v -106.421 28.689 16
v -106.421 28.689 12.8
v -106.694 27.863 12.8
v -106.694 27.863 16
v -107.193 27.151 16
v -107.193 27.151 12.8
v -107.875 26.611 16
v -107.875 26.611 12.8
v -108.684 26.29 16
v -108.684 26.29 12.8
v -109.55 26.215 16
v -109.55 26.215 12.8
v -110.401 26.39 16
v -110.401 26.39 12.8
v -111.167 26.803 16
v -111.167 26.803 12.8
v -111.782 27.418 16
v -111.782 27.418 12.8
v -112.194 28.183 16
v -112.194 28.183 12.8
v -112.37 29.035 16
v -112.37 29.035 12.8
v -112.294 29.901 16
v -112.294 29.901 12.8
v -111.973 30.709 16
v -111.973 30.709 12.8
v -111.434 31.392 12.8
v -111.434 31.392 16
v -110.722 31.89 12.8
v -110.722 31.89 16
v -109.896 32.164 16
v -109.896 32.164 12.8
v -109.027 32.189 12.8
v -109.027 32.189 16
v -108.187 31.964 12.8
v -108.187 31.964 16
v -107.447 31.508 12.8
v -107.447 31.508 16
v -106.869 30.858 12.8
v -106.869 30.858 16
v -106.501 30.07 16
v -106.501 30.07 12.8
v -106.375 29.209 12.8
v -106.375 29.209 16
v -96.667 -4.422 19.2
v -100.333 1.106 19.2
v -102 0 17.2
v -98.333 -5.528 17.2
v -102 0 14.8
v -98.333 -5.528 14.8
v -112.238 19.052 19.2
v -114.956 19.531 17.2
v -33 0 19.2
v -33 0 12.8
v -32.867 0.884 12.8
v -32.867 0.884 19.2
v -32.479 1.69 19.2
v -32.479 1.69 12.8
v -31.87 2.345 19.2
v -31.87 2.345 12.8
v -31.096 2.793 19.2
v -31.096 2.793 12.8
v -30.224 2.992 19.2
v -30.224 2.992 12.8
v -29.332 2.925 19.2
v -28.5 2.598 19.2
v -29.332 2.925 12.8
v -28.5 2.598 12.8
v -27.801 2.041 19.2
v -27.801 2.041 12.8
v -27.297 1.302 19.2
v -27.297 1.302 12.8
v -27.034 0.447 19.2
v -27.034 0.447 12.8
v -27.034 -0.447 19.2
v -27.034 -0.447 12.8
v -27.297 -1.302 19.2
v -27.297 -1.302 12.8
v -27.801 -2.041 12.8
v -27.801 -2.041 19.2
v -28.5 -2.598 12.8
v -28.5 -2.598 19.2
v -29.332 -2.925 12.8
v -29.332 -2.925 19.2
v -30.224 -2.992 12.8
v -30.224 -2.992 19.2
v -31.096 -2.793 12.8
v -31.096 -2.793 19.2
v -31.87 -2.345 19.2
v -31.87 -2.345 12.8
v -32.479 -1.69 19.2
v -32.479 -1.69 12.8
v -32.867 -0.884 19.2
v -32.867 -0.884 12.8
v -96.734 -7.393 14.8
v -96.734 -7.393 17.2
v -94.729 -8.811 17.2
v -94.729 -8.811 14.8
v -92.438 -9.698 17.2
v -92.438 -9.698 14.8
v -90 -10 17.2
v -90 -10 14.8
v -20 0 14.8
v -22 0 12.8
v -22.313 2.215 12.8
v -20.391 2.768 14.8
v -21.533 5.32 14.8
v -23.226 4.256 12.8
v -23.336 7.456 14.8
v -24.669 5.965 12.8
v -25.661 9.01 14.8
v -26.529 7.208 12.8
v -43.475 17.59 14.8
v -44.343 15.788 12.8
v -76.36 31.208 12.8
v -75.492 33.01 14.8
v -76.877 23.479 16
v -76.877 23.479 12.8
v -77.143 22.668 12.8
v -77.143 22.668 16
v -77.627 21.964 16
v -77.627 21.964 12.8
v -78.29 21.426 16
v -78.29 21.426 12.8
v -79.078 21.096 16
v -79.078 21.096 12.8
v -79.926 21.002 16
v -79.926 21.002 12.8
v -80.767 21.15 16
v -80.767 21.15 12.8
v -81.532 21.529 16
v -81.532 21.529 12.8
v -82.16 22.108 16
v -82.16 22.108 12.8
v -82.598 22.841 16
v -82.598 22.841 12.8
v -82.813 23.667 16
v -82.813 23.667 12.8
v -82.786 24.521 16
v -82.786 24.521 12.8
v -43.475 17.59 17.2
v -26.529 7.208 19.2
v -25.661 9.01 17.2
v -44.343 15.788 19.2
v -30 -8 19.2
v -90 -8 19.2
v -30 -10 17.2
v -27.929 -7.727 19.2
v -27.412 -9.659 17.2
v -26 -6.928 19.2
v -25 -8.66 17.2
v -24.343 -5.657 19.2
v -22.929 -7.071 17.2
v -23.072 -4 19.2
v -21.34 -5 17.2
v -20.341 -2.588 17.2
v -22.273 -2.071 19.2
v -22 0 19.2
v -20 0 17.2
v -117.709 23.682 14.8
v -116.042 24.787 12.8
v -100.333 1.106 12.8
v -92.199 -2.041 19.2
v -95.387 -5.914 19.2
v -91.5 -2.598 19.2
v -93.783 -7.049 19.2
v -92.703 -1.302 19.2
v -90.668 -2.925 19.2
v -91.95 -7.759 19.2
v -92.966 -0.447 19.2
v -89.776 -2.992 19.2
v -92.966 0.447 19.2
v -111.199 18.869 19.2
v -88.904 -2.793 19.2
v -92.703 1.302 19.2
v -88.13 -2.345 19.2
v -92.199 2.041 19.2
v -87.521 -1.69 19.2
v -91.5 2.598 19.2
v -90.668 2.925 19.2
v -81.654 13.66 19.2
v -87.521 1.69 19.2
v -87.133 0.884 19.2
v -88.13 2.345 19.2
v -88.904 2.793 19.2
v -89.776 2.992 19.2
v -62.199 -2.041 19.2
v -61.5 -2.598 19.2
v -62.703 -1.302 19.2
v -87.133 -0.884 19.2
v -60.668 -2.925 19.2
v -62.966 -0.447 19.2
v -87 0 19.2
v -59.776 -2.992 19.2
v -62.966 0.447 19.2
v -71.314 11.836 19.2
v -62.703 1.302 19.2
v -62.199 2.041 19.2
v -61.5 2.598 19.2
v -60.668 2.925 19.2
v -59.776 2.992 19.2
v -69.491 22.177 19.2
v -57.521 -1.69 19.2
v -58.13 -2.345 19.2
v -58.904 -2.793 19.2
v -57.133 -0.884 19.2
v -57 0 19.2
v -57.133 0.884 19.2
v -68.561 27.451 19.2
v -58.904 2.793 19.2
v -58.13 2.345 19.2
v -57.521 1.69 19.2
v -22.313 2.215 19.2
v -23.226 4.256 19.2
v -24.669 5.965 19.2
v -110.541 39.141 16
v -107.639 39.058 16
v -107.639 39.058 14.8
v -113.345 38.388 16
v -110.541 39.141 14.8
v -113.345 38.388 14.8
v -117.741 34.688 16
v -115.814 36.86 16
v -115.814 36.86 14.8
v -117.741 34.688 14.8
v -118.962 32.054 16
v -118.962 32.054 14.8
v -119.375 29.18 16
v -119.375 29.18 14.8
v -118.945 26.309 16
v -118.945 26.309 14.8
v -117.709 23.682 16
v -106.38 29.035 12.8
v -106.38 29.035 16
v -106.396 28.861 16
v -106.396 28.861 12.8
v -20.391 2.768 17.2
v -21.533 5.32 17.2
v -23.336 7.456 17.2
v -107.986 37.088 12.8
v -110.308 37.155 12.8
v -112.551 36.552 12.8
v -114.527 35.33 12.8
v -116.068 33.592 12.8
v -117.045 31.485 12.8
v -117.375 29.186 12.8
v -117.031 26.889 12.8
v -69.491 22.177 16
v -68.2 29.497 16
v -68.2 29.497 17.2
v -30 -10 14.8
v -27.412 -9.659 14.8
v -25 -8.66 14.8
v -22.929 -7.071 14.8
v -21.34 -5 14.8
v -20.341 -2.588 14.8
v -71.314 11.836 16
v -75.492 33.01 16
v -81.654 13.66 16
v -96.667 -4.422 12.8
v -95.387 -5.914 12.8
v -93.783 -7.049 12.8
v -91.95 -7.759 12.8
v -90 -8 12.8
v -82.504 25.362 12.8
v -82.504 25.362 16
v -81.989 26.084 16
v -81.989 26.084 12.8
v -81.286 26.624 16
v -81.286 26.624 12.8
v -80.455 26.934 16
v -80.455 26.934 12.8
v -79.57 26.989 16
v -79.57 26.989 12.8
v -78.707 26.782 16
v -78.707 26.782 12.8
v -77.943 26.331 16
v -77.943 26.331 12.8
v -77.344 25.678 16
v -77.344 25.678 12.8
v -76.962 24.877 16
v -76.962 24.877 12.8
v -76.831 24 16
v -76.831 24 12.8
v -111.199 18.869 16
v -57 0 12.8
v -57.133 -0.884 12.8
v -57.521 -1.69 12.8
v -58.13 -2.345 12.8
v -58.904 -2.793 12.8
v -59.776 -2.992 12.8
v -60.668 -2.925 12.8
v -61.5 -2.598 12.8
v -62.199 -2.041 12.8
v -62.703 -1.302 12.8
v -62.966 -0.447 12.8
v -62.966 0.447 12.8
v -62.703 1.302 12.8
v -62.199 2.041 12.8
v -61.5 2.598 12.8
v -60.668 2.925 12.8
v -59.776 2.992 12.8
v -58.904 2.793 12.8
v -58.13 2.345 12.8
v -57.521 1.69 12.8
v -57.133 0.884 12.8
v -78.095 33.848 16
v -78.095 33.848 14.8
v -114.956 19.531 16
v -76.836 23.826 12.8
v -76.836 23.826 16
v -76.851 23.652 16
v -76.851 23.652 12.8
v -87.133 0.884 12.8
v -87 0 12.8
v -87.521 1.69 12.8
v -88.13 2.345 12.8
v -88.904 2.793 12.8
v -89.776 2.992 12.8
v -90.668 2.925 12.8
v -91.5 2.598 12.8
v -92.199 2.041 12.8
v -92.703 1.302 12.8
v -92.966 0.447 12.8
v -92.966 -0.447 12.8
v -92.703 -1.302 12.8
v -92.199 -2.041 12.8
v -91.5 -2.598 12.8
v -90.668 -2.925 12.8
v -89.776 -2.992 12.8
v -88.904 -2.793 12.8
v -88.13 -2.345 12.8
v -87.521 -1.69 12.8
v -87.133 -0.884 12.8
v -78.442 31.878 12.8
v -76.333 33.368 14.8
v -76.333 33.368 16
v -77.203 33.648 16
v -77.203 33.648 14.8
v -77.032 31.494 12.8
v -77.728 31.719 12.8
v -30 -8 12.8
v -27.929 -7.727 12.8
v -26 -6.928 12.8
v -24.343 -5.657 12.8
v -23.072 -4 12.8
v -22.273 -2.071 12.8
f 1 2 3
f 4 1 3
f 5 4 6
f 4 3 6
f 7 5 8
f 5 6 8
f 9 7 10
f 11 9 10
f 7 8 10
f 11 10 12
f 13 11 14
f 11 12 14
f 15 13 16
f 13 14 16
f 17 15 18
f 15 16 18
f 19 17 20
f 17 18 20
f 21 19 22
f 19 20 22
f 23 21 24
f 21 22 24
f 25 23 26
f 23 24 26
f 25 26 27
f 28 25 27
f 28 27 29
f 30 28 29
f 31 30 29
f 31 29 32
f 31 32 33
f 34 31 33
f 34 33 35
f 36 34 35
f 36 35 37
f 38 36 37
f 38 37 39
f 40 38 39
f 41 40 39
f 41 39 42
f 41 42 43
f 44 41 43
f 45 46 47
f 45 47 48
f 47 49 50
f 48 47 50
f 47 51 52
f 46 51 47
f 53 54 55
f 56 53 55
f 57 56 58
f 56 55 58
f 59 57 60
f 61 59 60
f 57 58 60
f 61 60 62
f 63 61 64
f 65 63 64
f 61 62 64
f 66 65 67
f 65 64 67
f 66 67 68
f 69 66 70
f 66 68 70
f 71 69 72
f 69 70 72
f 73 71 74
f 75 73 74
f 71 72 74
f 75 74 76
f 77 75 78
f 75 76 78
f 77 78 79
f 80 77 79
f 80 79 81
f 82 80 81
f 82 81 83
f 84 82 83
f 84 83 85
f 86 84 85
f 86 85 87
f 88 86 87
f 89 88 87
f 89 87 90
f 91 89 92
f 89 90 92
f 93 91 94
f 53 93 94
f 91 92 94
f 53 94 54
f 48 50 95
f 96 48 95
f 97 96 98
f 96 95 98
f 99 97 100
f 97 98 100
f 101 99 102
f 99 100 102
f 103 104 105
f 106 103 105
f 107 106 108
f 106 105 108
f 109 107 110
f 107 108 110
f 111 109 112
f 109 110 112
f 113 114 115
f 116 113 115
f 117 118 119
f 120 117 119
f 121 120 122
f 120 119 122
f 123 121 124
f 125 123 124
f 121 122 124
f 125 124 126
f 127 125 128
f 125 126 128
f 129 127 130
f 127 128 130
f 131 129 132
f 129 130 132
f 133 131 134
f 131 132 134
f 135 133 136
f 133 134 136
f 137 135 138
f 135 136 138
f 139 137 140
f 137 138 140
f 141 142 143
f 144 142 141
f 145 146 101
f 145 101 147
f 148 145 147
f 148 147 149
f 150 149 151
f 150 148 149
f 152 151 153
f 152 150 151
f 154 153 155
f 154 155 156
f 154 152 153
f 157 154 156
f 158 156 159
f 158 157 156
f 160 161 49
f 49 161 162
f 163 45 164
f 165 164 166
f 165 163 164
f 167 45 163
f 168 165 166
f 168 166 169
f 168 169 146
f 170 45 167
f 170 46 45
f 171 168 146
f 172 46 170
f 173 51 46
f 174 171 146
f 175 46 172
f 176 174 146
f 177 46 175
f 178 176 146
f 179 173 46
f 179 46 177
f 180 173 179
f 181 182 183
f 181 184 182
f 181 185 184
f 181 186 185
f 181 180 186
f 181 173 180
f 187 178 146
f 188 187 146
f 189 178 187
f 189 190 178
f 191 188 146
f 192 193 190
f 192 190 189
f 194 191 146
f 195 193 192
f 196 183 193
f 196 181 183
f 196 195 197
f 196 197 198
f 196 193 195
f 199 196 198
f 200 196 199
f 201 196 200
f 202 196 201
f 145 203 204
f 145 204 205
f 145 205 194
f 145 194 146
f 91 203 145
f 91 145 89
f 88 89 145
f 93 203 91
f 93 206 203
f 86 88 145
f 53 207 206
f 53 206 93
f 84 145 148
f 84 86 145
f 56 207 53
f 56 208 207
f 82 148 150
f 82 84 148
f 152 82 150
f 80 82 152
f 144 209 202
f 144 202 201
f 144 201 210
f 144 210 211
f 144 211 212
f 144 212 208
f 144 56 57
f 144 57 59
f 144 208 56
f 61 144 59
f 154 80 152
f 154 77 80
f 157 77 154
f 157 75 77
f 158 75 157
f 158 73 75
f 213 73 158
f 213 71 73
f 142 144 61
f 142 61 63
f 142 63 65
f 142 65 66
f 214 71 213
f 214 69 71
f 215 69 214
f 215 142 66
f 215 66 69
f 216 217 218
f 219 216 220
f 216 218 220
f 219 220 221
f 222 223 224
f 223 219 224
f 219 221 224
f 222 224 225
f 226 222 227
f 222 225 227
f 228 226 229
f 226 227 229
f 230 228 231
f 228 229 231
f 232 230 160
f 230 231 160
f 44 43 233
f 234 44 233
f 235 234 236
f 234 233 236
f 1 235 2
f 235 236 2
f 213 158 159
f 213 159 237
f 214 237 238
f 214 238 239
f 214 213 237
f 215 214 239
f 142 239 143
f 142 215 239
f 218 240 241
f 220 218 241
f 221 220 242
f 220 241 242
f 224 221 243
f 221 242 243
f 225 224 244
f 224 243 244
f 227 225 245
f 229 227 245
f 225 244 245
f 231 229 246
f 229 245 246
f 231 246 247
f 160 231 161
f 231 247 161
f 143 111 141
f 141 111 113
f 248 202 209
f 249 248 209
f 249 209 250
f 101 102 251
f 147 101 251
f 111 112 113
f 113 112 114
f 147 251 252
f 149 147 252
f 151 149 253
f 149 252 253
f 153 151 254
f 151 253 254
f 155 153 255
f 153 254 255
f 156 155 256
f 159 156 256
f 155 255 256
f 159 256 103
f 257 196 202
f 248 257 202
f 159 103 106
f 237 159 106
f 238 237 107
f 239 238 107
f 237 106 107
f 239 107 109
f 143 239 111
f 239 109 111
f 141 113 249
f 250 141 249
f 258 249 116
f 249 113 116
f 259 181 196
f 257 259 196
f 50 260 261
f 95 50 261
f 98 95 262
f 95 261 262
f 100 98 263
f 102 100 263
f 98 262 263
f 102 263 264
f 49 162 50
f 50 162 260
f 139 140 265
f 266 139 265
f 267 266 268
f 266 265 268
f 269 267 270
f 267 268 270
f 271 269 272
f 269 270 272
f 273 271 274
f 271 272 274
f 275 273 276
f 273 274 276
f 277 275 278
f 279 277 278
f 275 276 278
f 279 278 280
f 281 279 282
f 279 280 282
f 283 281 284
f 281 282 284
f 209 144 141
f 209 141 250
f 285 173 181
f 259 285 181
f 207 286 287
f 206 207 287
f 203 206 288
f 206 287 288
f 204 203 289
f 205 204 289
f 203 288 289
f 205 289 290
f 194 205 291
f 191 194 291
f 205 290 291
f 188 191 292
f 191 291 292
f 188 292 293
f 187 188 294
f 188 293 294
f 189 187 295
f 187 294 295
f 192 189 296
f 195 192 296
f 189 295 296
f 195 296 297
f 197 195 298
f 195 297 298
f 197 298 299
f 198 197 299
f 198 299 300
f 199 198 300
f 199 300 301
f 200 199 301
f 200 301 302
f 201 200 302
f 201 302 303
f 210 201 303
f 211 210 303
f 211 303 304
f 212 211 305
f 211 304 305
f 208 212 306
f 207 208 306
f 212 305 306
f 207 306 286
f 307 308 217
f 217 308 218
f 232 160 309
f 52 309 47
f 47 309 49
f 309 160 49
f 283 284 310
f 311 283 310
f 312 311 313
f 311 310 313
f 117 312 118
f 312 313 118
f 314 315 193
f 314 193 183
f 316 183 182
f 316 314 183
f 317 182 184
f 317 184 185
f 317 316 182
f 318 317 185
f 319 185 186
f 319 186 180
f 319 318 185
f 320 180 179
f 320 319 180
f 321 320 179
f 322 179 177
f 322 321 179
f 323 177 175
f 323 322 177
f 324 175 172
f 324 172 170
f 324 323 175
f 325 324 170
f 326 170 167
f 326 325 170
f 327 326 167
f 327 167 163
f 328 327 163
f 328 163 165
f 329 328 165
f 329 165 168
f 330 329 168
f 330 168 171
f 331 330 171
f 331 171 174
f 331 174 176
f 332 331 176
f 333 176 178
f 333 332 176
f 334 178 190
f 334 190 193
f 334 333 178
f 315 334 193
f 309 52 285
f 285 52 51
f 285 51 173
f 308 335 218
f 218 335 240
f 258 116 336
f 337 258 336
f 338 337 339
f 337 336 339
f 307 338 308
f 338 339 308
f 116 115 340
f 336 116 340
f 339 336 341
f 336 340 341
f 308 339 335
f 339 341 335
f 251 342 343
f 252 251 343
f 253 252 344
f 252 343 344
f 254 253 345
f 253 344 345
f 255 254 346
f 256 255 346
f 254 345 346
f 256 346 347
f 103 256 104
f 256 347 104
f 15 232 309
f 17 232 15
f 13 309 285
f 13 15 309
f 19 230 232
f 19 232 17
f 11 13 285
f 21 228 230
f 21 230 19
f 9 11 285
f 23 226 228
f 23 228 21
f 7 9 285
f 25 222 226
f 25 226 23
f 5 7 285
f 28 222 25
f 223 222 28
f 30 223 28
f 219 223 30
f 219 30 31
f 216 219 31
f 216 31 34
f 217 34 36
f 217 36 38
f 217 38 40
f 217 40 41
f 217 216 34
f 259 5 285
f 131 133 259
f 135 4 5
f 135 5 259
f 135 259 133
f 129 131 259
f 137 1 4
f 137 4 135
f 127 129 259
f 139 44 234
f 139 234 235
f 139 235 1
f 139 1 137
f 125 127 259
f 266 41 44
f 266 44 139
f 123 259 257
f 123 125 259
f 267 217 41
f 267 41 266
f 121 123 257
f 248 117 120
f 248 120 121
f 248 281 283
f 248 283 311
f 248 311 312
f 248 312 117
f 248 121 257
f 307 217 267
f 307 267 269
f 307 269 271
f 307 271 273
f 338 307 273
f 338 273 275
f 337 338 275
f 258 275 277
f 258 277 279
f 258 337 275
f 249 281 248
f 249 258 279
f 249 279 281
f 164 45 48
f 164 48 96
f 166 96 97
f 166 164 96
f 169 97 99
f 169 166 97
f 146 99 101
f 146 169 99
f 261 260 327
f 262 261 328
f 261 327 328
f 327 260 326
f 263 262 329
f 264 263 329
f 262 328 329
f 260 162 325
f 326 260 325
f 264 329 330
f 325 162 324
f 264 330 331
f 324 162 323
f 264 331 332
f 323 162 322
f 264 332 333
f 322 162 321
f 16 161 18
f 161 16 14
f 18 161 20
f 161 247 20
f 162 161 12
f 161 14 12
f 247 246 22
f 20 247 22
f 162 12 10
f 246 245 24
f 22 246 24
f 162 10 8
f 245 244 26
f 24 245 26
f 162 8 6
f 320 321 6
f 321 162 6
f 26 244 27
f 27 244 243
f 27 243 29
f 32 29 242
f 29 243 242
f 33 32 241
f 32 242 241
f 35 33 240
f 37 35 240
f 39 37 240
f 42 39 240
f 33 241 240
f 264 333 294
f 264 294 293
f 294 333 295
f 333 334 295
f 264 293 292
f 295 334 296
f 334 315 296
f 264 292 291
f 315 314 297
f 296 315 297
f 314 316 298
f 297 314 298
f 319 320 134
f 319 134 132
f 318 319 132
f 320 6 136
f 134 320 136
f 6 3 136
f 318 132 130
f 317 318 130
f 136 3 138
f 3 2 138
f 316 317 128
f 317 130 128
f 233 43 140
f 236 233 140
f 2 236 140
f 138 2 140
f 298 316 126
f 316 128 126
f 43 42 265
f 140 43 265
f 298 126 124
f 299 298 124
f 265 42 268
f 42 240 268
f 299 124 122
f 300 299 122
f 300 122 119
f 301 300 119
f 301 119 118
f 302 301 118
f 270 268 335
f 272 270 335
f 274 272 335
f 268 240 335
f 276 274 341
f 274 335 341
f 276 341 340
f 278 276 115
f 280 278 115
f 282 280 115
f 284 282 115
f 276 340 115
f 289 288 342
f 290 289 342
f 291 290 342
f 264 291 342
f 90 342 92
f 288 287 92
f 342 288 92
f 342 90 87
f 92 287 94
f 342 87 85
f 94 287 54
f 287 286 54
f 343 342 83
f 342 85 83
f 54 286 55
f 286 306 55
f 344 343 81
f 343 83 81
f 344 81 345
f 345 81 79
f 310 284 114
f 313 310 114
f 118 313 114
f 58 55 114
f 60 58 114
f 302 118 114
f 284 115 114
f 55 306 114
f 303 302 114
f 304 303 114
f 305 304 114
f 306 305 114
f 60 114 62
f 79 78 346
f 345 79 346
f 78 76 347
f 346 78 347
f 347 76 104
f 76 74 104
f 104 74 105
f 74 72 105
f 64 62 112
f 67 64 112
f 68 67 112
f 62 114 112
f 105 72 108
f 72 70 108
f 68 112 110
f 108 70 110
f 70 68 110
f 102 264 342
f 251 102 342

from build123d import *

# Parameters (mm, degrees)
F0_R     = 3
F1_DEPTH = 6.4
F4_DEPTH = 3.2
F5_SIZE  = 2


with BuildPart() as f1:
    # F0 (on Top) → F1 (new body)
    with BuildSketch(Plane.XY):
        with BuildLine():
            Line((-69.9830439783, 22.2635182233), (-43.4754125815, 17.5895076134))
            Line((-43.4754125815, 17.5895076134), (-75.4919030254, 33.0095051449))
            ThreePointArc((-75.4919030254, 33.0095051449), (-71.3637669974, 29.3201416884), (-69.8311215084, 24))
            ThreePointArc((-69.8311215084, 24), (-69.8691745275, 23.1284425725), (-69.9830439783, 22.2635182233))
        make_face()
        with BuildLine():
            Line((-90, -10), (-30, -10))
            ThreePointArc((-30, -10), (-37.0710678119, -7.0710678119), (-40, 0))
            Line((-40, 0), (-57, 0))
            ThreePointArc((-57, 0), (-60, -3), (-63, 0))
            Line((-63, 0), (-80, 0))
            ThreePointArc((-80, 0), (-82.9289321881, -7.0710678119), (-90, -10))
        make_face()
        with BuildLine():
            Line((-78.0946397318, 33.8480775301), (-107.6388723221, 39.0575228601))
            ThreePointArc((-107.6388723221, 39.0575228601), (-101.7149096676, 35.6373214269), (-99.3753540988, 29.20944533))
            ThreePointArc((-99.3753540988, 29.20944533), (-99.4134071179, 28.3378879025), (-99.5272765687, 27.4729635533))
            Line((-99.5272765687, 27.4729635533), (-89.6791990386, 25.7364817767))
            ThreePointArc((-89.6791990386, 25.7364817767), (-85.566885872, 32.1915204429), (-78.0946397318, 33.8480775301))
        make_face()
        with BuildLine():
            ThreePointArc((-89.6791990386, 25.7364817767), (-81.5676032851, 14.1519224699), (-69.9830439783, 22.2635182233))
            Line((-69.9830439783, 22.2635182233), (-76.8766982494, 23.479055467))
            ThreePointArc((-76.8766982494, 23.479055467), (-80.3520660414, 21.045576741), (-82.7855447675, 24.520944533))
            Line((-82.7855447675, 24.520944533), (-89.6791990386, 25.7364817767))
        make_face()
        with BuildLine():
            ThreePointArc((-69.8311215084, 24), (-71.3637669974, 29.3201416884), (-75.4919030254, 33.0095051449))
            ThreePointArc((-75.4919030254, 33.0095051449), (-76.7644727965, 33.5181755435), (-78.0946397318, 33.8480775301))
            ThreePointArc((-78.0946397318, 33.8480775301), (-85.566885872, 32.1915204429), (-89.6791990386, 25.7364817767))
            Line((-89.6791990386, 25.7364817767), (-82.7855447675, 24.520944533))
            ThreePointArc((-82.7855447675, 24.520944533), (-79.5696542802, 26.9885840943), (-76.8311215084, 24))
            ThreePointArc((-76.8311215084, 24), (-76.8425374142, 23.7385327718), (-76.8766982494, 23.479055467))
            Line((-76.8766982494, 23.479055467), (-69.9830439783, 22.2635182233))
            ThreePointArc((-69.9830439783, 22.2635182233), (-69.8691745275, 23.1284425725), (-69.8311215084, 24))
        make_face()
        with BuildLine():
            Line((-57, 0), (-40, 0))
            ThreePointArc((-40, 0), (-35.3201416884, 8.467354511), (-25.660781517, 9.0095051449))
            Line((-25.660781517, 9.0095051449), (-43.4754125815, 17.5895076134))
            Line((-43.4754125815, 17.5895076134), (-69.9830439783, 22.2635182233))
            ThreePointArc((-69.9830439783, 22.2635182233), (-81.5676032851, 14.1519224699), (-89.6791990386, 25.7364817767))
            Line((-89.6791990386, 25.7364817767), (-99.5272765687, 27.4729635533))
            ThreePointArc((-99.5272765687, 27.4729635533), (-107.3340404203, 19.4200102868), (-117.7086874321, 23.6817373461))
            Line((-117.7086874321, 23.6817373461), (-102, 0))
            Line((-102, 0), (-98.3333333333, -5.5277079839))
            ThreePointArc((-98.3333333333, -5.5277079839), (-92.8867513459, 9.5742710776), (-80, 0))
            Line((-80, 0), (-63, 0))
            ThreePointArc((-63, 0), (-60, 3), (-57, 0))
        make_face()
        with BuildLine():
            ThreePointArc((-98.3333333333, -5.5277079839), (-94.7287905515, -8.8112734562), (-90, -10))
            ThreePointArc((-90, -10), (-82.9289321881, -7.0710678119), (-80, 0))
            ThreePointArc((-80, 0), (-92.8867513459, 9.5742710776), (-98.3333333333, -5.5277079839))
        make_face()
        with Locations((-90, 0)):
            Circle(F0_R, mode=Mode.SUBTRACT)
        with BuildLine():
            ThreePointArc((-107.6388723221, 39.0575228601), (-117.7409567465, 34.6881944885), (-117.7086874321, 23.6817373461))
            ThreePointArc((-117.7086874321, 23.6817373461), (-107.3340404203, 19.4200102868), (-99.5272765687, 27.4729635533))
            ThreePointArc((-99.5272765687, 27.4729635533), (-99.4134071179, 28.3378879025), (-99.3753540988, 29.20944533))
            ThreePointArc((-99.3753540988, 29.20944533), (-101.7149096676, 35.6373214269), (-107.6388723221, 39.0575228601))
        make_face()
        with BuildLine():
            ThreePointArc((-106.3753540988, 29.20944533), (-106.3867700045, 28.9479781018), (-106.4209308398, 28.688500797))
            ThreePointArc((-106.4209308398, 28.688500797), (-112.3639381931, 29.4709125583), (-106.3753540988, 29.20944533))
        make_face(mode=Mode.SUBTRACT)
        with BuildLine():
            ThreePointArc((-40, 0), (-37.0710678119, -7.0710678119), (-30, -10))
            ThreePointArc((-30, -10), (-22.9289321881, -7.0710678119), (-20, 0))
            Line((-20, 0), (-27, 0))
            ThreePointArc((-27, 0), (-30, -3), (-33, 0))
            Line((-33, 0), (-40, 0))
        make_face()
        with BuildLine():
            Line((-27, 0), (-20, 0))
            ThreePointArc((-20, 0), (-21.532645489, 5.3201416884), (-25.660781517, 9.0095051449))
            ThreePointArc((-25.660781517, 9.0095051449), (-35.3201416884, 8.467354511), (-40, 0))
            Line((-40, 0), (-33, 0))
            ThreePointArc((-33, 0), (-30, 3), (-27, 0))
        make_face()
    extrude(amount=F1_DEPTH)

    # F3 (on offset) → F4 (cut)
    with BuildSketch(Plane.XY.offset(6.4)):
        with BuildLine():
            Line((-121.5190547769, 44.7572868572), (-125.6350207552, 21.4144838341))
            Line((-125.6350207552, 21.4144838341), (-111.1986603593, 18.868963993))
            Line((-111.1986603593, 18.868963993), (-81.6544272584, 13.659518573))
            ThreePointArc((-81.6544272584, 13.659518573), (-86.5803914551, 32.043466615), (-69.3311215084, 24))
            ThreePointArc((-69.3311215084, 24), (-69.3710771859, 23.0848646168), (-69.4906401312, 22.1766939678))
            Line((-69.4906401312, 22.1766939678), (-67.197979989, 35.179015751))
            Line((-67.197979989, 35.179015751), (-121.5190547769, 44.7572868572))
        make_face()
        with BuildLine():
            ThreePointArc((-98.8753540988, 29.20944533), (-102.6260843507, 21.1659785483), (-111.1986603593, 18.868963993))
            ThreePointArc((-111.1986603593, 18.868963993), (-116.1246238469, 37.2529121117), (-98.8753540988, 29.20944533))
        make_face(mode=Mode.SUBTRACT)
        with BuildLine():
            ThreePointArc((-98.8753540988, 29.20944533), (-116.1246238469, 37.2529121117), (-111.1986603593, 18.868963993))
            ThreePointArc((-111.1986603593, 18.868963993), (-102.6260843507, 21.1659785483), (-98.8753540988, 29.20944533))
        make_face()
        with BuildLine():
            ThreePointArc((-69.3311215084, 24), (-86.5803914551, 32.043466615), (-81.6544272584, 13.659518573))
            ThreePointArc((-81.6544272584, 13.659518573), (-73.808568948, 15.3989035201), (-69.4906401312, 22.1766939678))
            ThreePointArc((-69.4906401312, 22.1766939678), (-69.3710771859, 23.0848646168), (-69.3311215084, 24))
        make_face()
        with BuildLine():
            ThreePointArc((-69.4906401312, 22.1766939678), (-73.808568948, 15.3989035201), (-81.6544272584, 13.659518573))
            Line((-81.6544272584, 13.659518573), (-71.3139459673, 11.8362127279))
            Line((-71.3139459673, 11.8362127279), (-69.4906401312, 22.1766939678))
        make_face()
    extrude(amount=-F4_DEPTH, mode=Mode.SUBTRACT)

    # F5
    f5_edges = [f1.edges().sort_by_distance(p)[0] for p in [
        (-50.576342, 21.009505, 0),
        (-46.930289, 19.253468, 6.4),
    ]]
    chamfer(f5_edges, length=F5_SIZE)


with BuildPart() as f6_1:
    # F6: instance of F1
    add(f1.part.mirror(Plane(origin=(-64.9639850302, 5.284700152, 6.4), x_dir=(1, 0, 0), z_dir=(0, 0, 1))))


with BuildPart() as f8_1:
    # F8: instance of F6_1
    add(f6_1.part.mirror(Plane(origin=(-73.367736388, 11.21261041, 12.8), x_dir=(1, 0, 0), z_dir=(0, 0, 1))))


solid = f8_1.part
